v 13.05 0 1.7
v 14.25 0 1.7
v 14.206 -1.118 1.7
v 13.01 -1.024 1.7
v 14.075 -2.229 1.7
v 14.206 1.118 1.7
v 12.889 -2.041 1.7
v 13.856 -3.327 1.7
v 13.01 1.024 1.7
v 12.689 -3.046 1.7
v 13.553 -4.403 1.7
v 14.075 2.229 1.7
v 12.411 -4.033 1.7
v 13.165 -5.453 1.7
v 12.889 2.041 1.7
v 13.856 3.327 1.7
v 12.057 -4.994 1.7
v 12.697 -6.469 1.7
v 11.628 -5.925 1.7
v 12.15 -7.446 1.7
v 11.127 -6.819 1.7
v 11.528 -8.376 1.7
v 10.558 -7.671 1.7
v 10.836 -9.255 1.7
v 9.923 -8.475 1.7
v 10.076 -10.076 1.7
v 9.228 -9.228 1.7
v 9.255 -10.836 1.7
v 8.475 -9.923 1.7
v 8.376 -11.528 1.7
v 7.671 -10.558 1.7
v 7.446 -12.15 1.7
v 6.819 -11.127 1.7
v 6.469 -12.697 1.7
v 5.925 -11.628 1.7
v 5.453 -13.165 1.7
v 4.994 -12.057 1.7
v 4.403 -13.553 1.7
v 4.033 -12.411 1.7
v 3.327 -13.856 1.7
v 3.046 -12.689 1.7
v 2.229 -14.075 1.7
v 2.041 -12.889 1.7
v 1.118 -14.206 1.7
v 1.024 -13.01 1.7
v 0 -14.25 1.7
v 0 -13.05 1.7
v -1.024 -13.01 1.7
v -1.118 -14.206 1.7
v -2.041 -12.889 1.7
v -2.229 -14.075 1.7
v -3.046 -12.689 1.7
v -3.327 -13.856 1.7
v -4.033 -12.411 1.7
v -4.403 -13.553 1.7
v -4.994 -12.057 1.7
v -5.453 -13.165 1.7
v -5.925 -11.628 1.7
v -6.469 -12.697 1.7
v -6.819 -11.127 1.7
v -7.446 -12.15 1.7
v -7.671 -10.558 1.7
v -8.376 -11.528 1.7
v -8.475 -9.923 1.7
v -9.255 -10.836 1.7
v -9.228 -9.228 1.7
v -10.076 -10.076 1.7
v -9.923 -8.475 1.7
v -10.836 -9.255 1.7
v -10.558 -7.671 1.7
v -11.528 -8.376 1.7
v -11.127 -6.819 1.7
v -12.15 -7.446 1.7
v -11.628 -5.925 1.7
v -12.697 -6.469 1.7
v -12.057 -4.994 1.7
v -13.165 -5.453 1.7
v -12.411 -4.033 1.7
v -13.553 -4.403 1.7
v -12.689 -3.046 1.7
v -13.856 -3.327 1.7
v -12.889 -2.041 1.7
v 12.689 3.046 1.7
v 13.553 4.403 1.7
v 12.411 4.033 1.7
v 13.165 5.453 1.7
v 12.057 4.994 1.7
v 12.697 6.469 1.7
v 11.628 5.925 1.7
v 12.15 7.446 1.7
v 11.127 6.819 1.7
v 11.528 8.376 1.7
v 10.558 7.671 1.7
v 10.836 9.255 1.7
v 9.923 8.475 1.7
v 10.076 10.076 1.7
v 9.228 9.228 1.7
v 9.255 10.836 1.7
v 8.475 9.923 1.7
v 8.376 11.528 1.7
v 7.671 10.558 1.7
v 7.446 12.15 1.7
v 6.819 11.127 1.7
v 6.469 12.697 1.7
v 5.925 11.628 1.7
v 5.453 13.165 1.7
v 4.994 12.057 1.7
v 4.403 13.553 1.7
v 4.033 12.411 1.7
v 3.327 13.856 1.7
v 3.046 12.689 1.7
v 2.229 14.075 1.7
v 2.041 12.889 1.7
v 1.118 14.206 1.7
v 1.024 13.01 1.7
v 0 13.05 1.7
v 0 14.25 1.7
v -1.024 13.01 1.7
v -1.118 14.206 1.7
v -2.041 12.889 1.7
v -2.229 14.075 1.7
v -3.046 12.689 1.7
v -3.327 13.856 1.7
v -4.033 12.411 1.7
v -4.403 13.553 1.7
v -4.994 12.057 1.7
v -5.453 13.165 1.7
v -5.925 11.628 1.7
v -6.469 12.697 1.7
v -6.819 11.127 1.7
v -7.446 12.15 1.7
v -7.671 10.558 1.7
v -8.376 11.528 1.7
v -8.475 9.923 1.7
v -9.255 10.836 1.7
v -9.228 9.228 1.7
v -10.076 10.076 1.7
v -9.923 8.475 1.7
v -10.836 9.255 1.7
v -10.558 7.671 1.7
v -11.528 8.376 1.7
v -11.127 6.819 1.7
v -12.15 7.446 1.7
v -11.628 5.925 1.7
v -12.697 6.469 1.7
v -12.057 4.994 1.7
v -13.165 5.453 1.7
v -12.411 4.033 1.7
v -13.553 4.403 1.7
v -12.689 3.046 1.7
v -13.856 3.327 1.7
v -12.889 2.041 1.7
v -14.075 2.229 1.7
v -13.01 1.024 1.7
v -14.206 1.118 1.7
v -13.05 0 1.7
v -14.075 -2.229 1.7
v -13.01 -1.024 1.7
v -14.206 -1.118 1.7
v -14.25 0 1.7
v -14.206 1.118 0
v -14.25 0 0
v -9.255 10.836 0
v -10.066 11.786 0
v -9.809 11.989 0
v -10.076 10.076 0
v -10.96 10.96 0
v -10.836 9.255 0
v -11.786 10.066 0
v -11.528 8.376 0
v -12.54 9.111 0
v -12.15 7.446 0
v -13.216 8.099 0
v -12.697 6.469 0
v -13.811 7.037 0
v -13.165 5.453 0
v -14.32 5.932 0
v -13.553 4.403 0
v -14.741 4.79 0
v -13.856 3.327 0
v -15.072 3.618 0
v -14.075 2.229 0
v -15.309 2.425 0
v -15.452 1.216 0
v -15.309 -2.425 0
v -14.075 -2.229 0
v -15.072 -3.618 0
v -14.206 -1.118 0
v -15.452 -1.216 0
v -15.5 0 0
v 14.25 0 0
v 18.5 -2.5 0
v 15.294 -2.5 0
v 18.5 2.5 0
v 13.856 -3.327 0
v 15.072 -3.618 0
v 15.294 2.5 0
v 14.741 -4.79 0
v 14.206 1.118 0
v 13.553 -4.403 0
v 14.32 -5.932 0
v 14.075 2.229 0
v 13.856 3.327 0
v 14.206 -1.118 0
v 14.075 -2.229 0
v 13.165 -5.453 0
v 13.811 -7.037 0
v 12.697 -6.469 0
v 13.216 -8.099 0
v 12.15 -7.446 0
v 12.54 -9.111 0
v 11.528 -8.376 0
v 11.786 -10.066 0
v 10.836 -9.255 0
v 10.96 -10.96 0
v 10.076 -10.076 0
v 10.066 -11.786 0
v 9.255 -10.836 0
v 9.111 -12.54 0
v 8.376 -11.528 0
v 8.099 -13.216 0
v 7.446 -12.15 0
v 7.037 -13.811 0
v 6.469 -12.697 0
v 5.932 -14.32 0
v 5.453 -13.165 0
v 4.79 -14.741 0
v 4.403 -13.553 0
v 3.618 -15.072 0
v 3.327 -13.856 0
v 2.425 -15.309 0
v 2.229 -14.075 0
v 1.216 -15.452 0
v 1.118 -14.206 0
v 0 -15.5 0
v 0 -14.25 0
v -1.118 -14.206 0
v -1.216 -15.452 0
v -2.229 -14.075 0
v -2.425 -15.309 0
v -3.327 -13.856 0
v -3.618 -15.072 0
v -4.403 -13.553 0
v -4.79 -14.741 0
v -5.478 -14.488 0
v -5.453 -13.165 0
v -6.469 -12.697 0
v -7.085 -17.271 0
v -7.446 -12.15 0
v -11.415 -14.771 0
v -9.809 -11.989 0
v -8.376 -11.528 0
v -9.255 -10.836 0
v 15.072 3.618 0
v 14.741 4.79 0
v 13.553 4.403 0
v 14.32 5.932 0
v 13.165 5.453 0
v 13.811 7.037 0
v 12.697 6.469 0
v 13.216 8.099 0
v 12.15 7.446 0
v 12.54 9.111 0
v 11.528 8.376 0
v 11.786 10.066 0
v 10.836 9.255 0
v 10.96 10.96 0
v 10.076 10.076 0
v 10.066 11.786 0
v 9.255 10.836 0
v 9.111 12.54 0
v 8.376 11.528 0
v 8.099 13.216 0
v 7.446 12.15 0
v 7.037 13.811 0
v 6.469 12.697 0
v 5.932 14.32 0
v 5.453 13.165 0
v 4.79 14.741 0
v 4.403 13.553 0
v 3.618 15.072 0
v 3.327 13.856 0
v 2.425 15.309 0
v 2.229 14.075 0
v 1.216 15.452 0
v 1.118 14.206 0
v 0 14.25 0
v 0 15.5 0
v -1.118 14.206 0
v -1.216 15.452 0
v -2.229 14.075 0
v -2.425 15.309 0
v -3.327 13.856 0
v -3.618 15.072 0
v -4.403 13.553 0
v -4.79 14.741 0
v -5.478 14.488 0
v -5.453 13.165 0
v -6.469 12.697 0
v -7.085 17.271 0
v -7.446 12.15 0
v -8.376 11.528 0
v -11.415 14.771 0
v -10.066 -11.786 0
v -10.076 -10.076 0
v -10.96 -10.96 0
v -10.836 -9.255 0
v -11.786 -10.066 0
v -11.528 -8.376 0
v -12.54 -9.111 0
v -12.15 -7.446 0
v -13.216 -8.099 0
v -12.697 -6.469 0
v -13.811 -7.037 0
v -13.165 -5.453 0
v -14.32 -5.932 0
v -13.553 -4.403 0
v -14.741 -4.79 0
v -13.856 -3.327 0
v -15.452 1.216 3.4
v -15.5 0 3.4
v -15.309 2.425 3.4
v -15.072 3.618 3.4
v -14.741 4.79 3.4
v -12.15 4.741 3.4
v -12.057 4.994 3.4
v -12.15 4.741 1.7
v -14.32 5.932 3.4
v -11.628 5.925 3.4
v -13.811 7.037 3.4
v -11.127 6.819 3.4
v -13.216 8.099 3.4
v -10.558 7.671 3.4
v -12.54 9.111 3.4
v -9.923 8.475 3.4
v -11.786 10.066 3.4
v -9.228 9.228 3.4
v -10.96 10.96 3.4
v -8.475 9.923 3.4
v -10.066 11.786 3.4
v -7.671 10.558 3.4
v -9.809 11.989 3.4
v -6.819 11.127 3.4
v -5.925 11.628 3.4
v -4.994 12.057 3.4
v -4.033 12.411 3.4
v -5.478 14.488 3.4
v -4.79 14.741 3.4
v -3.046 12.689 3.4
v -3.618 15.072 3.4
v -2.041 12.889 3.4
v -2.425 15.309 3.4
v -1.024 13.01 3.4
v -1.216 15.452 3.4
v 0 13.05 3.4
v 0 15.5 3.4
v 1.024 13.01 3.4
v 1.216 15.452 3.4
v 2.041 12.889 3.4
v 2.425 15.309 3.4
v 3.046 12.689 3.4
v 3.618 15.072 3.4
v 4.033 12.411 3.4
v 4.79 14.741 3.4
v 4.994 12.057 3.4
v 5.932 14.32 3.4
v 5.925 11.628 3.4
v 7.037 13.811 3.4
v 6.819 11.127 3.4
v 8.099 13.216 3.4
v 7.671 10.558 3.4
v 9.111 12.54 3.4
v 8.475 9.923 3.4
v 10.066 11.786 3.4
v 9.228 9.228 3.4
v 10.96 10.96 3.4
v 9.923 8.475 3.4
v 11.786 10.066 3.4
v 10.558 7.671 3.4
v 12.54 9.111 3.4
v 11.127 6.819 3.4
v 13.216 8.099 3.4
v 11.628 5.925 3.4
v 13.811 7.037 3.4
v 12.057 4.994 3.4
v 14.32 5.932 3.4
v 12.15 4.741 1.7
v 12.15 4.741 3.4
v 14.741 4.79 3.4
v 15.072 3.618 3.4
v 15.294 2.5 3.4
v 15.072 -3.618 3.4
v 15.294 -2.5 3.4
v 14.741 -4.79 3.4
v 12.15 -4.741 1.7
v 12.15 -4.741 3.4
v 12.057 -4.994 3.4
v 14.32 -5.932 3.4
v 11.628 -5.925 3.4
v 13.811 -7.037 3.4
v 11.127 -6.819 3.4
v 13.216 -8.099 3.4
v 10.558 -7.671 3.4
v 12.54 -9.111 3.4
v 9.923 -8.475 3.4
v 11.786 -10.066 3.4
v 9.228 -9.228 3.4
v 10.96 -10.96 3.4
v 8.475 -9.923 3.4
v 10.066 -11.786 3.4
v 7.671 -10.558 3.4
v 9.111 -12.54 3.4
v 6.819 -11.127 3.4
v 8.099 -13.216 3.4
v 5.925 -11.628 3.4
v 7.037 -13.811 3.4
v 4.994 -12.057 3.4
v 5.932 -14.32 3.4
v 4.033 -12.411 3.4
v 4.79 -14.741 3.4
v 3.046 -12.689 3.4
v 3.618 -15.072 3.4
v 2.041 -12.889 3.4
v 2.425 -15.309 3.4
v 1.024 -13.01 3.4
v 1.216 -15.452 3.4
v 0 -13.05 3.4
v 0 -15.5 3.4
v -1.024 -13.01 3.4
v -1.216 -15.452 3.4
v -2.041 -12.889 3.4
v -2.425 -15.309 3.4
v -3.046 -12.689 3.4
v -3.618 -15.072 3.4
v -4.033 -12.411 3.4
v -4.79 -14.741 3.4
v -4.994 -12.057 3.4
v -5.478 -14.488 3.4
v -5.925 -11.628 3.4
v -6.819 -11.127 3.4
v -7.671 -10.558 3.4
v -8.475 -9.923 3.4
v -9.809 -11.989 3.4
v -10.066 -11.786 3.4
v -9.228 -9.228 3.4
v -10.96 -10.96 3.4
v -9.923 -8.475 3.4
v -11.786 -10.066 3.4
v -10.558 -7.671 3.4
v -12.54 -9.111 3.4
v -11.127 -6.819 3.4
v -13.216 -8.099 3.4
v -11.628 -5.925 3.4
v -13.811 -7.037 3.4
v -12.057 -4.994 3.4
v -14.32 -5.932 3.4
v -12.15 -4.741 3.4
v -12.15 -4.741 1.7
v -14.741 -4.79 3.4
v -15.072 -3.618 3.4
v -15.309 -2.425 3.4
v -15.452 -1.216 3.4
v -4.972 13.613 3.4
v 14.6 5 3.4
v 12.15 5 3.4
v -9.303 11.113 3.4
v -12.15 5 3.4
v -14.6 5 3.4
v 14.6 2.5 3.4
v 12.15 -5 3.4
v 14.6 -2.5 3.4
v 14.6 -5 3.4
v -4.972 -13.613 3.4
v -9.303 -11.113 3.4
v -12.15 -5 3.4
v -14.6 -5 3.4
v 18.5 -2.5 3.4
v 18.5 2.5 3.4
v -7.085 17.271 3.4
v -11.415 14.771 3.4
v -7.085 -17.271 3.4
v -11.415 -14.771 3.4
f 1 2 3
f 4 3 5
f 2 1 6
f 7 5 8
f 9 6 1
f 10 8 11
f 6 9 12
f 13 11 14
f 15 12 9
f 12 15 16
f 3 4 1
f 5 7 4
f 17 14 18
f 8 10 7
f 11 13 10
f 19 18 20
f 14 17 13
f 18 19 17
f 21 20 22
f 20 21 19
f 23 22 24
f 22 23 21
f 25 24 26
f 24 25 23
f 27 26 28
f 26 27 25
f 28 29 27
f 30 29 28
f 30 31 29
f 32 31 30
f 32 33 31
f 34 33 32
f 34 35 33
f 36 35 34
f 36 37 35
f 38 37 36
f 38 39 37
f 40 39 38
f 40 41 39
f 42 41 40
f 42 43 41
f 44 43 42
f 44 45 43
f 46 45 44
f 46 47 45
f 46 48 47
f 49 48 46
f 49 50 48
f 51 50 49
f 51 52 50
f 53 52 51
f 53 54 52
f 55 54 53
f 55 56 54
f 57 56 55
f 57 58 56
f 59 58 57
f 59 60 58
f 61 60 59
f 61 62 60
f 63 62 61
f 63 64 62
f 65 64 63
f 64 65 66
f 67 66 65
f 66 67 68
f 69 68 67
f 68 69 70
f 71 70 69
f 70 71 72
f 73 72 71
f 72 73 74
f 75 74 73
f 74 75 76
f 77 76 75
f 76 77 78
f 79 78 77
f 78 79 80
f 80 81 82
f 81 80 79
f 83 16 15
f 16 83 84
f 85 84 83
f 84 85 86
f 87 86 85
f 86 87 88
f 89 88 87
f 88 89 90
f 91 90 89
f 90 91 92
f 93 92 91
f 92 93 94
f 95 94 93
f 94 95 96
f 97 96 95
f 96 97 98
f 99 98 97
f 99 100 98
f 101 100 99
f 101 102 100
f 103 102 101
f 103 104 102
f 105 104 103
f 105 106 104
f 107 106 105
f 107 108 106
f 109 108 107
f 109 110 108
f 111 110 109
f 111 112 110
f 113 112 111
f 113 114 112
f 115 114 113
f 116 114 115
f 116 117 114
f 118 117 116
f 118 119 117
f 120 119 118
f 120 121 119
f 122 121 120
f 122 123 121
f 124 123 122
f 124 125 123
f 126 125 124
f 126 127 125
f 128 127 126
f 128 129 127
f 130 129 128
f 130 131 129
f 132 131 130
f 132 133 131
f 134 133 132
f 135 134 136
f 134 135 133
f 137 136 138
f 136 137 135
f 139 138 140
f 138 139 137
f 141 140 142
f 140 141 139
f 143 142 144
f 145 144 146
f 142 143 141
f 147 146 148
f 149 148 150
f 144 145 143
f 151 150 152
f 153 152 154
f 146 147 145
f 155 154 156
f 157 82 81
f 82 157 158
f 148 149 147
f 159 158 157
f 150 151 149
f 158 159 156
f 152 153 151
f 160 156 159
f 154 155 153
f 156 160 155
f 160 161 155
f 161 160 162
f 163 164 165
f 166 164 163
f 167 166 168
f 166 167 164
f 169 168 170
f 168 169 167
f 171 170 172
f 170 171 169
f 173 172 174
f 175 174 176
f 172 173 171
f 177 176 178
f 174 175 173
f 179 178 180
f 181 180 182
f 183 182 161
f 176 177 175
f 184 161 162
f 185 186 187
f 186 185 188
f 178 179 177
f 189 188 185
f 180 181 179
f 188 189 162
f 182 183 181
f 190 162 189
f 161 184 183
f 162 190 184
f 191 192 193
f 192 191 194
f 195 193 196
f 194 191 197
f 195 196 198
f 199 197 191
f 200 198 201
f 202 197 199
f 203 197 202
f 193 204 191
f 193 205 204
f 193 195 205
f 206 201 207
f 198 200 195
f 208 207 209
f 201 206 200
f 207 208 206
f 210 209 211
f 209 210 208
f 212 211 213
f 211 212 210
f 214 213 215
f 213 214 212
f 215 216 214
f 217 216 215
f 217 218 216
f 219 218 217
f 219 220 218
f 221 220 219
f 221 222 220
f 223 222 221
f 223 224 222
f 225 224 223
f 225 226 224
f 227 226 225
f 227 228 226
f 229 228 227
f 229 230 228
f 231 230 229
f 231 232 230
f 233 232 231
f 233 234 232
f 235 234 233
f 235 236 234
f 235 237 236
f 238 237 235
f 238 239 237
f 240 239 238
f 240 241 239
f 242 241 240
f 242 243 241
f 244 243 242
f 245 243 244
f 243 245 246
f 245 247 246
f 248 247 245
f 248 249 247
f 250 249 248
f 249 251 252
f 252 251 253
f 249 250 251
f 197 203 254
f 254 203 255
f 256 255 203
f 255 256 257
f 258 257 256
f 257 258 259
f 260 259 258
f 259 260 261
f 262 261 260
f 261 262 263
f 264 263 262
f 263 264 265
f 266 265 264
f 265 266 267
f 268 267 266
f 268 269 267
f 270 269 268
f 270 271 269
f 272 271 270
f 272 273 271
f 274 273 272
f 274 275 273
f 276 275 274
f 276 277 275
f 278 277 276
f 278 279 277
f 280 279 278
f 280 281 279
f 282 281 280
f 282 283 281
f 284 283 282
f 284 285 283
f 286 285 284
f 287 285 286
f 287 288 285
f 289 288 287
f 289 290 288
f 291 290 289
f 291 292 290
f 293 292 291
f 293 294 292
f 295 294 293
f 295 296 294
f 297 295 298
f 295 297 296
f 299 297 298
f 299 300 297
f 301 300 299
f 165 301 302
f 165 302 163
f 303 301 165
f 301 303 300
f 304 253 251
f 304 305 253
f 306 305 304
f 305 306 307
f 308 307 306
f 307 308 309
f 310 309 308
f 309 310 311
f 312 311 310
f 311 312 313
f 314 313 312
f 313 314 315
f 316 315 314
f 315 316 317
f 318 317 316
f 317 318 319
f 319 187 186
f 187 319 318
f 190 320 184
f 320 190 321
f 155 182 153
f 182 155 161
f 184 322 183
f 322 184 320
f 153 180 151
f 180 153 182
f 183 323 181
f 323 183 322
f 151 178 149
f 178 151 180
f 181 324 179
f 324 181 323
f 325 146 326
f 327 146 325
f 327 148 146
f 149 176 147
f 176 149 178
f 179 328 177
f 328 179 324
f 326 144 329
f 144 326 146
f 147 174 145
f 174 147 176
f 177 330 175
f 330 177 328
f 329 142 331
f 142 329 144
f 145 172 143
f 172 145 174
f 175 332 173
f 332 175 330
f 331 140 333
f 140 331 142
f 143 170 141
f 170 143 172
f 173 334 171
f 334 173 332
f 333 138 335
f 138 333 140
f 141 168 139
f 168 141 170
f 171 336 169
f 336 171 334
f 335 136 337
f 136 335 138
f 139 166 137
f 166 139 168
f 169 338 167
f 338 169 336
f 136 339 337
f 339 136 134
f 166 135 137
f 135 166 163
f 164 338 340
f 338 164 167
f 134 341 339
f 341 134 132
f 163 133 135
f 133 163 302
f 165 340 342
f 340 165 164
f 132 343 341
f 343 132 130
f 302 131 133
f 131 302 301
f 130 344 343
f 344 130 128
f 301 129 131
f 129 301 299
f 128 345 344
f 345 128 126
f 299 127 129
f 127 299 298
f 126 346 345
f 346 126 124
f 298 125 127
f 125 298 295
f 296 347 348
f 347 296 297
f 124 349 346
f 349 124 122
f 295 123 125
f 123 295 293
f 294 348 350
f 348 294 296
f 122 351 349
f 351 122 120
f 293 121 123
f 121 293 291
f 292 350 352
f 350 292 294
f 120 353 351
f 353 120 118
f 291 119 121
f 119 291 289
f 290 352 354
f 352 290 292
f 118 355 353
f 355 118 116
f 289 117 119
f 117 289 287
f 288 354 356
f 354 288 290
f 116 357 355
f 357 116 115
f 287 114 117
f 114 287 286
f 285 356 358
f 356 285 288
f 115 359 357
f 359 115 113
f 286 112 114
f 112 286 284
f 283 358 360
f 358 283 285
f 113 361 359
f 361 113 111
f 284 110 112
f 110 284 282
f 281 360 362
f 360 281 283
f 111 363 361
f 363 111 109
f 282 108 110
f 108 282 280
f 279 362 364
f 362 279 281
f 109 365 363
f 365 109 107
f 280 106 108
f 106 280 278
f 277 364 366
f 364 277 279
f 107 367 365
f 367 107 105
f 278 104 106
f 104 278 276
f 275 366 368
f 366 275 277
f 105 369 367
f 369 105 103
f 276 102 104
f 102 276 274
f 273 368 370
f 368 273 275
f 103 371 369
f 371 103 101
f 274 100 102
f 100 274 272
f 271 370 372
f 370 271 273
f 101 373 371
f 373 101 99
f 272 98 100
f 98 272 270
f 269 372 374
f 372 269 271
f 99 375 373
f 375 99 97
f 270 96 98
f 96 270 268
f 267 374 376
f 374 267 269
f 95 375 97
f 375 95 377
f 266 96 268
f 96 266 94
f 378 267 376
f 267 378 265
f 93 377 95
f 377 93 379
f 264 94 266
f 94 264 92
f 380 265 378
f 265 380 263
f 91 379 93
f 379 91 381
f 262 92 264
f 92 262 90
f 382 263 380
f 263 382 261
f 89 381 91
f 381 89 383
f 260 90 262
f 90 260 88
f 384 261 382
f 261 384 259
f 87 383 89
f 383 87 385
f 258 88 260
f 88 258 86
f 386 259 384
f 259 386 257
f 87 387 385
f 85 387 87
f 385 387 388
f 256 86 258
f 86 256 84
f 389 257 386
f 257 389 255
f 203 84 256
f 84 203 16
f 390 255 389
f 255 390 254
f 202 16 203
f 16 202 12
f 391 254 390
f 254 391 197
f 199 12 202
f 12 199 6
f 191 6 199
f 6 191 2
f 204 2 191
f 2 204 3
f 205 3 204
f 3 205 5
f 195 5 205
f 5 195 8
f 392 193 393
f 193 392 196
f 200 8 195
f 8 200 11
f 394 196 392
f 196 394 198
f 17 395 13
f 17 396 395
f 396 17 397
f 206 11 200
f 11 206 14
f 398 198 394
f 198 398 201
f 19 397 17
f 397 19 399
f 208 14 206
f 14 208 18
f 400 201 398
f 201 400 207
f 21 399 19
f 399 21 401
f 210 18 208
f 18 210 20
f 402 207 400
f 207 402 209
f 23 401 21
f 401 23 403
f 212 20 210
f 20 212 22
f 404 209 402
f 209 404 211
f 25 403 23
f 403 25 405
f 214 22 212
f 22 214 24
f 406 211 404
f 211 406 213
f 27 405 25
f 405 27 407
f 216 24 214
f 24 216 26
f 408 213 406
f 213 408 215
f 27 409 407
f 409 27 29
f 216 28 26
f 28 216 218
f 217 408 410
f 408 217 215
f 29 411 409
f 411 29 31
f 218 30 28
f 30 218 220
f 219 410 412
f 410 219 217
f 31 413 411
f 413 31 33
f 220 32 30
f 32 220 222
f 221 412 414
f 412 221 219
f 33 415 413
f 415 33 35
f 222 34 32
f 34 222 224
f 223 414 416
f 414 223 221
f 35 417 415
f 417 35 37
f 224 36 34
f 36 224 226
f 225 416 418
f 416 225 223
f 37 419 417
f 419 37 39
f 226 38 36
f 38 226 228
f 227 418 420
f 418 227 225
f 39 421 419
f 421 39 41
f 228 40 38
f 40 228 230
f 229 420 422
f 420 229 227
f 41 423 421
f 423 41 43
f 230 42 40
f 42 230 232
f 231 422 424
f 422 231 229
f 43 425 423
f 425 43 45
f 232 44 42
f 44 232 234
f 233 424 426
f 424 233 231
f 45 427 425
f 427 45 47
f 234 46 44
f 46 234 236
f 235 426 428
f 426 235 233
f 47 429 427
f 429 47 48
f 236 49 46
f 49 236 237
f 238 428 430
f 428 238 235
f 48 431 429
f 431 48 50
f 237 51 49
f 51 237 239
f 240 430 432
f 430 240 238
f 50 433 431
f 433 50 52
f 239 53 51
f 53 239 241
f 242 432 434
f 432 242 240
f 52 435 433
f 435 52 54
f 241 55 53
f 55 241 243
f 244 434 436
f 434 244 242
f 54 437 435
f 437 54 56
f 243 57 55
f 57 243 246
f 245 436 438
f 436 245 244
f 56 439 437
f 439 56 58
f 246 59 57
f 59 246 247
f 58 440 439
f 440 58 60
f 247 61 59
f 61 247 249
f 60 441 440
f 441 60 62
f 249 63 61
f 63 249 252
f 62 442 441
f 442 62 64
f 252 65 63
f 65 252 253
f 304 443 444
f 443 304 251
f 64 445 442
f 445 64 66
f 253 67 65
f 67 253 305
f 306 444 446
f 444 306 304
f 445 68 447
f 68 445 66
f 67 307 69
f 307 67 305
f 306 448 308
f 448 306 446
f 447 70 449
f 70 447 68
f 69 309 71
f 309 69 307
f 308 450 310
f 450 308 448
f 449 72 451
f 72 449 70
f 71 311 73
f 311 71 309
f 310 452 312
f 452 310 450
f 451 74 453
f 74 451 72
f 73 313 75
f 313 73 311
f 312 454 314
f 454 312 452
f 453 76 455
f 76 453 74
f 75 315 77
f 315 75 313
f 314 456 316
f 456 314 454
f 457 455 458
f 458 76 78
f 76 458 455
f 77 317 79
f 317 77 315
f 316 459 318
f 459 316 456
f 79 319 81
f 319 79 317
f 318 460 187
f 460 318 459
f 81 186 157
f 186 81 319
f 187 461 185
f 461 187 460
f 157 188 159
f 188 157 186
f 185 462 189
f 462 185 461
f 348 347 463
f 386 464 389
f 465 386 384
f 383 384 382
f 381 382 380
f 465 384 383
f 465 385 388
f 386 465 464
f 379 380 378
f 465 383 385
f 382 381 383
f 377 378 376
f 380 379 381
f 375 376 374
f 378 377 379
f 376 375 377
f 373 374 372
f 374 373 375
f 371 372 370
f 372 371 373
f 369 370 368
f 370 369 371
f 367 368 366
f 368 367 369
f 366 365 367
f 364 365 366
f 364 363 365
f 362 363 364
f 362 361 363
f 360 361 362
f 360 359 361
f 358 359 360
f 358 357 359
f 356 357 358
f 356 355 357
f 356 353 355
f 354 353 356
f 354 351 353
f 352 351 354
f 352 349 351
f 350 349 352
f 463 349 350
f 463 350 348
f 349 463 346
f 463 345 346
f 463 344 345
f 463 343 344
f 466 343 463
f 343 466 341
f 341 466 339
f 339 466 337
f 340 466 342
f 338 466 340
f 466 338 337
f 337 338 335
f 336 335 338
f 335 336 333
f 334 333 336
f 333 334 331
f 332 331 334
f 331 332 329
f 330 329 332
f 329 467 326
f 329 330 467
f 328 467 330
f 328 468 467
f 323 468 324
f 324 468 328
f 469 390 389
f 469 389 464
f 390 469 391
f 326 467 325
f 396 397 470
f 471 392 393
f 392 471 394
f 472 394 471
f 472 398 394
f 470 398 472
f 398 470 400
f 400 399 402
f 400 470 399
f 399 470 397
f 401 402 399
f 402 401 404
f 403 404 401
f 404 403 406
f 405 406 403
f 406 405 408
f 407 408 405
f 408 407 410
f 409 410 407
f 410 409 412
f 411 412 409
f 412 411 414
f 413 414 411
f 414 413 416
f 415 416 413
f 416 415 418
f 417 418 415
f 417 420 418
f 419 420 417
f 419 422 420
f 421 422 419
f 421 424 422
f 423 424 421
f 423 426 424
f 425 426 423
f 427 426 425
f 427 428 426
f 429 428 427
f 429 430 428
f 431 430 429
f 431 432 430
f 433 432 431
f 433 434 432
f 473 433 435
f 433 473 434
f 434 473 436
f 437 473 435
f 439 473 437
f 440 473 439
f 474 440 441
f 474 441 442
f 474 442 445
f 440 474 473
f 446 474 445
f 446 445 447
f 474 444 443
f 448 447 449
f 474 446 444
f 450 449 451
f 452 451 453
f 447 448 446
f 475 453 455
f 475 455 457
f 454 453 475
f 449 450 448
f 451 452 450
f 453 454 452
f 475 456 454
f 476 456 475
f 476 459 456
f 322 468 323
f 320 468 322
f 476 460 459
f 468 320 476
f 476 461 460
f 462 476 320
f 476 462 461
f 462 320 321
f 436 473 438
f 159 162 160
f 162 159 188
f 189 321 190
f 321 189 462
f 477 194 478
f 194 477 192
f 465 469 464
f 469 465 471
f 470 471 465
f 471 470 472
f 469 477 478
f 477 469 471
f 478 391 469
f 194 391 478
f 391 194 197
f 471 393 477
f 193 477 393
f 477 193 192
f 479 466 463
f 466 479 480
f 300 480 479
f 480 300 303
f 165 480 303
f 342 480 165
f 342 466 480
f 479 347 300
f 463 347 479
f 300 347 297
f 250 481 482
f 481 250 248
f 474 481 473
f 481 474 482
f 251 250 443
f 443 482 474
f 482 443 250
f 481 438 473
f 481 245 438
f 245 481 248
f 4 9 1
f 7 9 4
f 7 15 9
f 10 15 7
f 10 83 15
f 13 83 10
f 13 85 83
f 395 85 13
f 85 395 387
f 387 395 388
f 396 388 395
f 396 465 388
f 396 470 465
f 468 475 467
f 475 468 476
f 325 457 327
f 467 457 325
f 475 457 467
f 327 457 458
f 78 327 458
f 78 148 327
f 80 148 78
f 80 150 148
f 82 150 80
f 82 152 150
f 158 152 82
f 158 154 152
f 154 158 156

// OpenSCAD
//Speedo drive ring for the Yamaha TTR 250 with the analoge speedo
//By simon.pilepich@gmail.com Jan 2020
//https://www.youtube.com/watch?v=sA4e6sW0mGw
//
//Please use or modify this however you like without credit or liability

diameter_rd=31; //outer diameter of the the ring
diameter_id=22; //doesn't actually get used.
diameter_sd=26.1; //step diameter (the step has the the flats on it.)
diameter_md=28.5; //inner diameter of the tube.
face_distance=24.3; //                                       


width = (diameter_rd - diameter_sd)/2;
cutback = (diameter_md - diameter_sd)/2;
lip = 1.7;
height = lip*2;
tab_width = 5;
tab_length = 3;
tab_height = lip*2;
o = diameter_sd/2;

module tab() {
rotate([0, 0, 0])
    translate ([o+(width/2),0-(tab_width/2),height-tab_height])
        cube(size=[tab_length+(width/2),tab_width,tab_height]);
}

module internal_face() {
    translate ([face_distance/2,0-(tab_width),height-lip])
        cube(size=[width,tab_width*2,lip]);
}


union(){
    //This is the basic shape
    rotate_extrude($fn = 80)
        polygon( points=[[o+cutback,0],[o+width,0],[o+width,height],[o,height],[o,height-lip],[o+cutback,height-lip]]);
    
    //Add 3 tabs ad different angles
    tab();
    rotate([0, 0, 120])
        tab();
    rotate([0, 0, 240])
        tab();
    
    // Add the internal flat bits
    internal_face();
    rotate([0, 0, 180])
        internal_face();   
}
